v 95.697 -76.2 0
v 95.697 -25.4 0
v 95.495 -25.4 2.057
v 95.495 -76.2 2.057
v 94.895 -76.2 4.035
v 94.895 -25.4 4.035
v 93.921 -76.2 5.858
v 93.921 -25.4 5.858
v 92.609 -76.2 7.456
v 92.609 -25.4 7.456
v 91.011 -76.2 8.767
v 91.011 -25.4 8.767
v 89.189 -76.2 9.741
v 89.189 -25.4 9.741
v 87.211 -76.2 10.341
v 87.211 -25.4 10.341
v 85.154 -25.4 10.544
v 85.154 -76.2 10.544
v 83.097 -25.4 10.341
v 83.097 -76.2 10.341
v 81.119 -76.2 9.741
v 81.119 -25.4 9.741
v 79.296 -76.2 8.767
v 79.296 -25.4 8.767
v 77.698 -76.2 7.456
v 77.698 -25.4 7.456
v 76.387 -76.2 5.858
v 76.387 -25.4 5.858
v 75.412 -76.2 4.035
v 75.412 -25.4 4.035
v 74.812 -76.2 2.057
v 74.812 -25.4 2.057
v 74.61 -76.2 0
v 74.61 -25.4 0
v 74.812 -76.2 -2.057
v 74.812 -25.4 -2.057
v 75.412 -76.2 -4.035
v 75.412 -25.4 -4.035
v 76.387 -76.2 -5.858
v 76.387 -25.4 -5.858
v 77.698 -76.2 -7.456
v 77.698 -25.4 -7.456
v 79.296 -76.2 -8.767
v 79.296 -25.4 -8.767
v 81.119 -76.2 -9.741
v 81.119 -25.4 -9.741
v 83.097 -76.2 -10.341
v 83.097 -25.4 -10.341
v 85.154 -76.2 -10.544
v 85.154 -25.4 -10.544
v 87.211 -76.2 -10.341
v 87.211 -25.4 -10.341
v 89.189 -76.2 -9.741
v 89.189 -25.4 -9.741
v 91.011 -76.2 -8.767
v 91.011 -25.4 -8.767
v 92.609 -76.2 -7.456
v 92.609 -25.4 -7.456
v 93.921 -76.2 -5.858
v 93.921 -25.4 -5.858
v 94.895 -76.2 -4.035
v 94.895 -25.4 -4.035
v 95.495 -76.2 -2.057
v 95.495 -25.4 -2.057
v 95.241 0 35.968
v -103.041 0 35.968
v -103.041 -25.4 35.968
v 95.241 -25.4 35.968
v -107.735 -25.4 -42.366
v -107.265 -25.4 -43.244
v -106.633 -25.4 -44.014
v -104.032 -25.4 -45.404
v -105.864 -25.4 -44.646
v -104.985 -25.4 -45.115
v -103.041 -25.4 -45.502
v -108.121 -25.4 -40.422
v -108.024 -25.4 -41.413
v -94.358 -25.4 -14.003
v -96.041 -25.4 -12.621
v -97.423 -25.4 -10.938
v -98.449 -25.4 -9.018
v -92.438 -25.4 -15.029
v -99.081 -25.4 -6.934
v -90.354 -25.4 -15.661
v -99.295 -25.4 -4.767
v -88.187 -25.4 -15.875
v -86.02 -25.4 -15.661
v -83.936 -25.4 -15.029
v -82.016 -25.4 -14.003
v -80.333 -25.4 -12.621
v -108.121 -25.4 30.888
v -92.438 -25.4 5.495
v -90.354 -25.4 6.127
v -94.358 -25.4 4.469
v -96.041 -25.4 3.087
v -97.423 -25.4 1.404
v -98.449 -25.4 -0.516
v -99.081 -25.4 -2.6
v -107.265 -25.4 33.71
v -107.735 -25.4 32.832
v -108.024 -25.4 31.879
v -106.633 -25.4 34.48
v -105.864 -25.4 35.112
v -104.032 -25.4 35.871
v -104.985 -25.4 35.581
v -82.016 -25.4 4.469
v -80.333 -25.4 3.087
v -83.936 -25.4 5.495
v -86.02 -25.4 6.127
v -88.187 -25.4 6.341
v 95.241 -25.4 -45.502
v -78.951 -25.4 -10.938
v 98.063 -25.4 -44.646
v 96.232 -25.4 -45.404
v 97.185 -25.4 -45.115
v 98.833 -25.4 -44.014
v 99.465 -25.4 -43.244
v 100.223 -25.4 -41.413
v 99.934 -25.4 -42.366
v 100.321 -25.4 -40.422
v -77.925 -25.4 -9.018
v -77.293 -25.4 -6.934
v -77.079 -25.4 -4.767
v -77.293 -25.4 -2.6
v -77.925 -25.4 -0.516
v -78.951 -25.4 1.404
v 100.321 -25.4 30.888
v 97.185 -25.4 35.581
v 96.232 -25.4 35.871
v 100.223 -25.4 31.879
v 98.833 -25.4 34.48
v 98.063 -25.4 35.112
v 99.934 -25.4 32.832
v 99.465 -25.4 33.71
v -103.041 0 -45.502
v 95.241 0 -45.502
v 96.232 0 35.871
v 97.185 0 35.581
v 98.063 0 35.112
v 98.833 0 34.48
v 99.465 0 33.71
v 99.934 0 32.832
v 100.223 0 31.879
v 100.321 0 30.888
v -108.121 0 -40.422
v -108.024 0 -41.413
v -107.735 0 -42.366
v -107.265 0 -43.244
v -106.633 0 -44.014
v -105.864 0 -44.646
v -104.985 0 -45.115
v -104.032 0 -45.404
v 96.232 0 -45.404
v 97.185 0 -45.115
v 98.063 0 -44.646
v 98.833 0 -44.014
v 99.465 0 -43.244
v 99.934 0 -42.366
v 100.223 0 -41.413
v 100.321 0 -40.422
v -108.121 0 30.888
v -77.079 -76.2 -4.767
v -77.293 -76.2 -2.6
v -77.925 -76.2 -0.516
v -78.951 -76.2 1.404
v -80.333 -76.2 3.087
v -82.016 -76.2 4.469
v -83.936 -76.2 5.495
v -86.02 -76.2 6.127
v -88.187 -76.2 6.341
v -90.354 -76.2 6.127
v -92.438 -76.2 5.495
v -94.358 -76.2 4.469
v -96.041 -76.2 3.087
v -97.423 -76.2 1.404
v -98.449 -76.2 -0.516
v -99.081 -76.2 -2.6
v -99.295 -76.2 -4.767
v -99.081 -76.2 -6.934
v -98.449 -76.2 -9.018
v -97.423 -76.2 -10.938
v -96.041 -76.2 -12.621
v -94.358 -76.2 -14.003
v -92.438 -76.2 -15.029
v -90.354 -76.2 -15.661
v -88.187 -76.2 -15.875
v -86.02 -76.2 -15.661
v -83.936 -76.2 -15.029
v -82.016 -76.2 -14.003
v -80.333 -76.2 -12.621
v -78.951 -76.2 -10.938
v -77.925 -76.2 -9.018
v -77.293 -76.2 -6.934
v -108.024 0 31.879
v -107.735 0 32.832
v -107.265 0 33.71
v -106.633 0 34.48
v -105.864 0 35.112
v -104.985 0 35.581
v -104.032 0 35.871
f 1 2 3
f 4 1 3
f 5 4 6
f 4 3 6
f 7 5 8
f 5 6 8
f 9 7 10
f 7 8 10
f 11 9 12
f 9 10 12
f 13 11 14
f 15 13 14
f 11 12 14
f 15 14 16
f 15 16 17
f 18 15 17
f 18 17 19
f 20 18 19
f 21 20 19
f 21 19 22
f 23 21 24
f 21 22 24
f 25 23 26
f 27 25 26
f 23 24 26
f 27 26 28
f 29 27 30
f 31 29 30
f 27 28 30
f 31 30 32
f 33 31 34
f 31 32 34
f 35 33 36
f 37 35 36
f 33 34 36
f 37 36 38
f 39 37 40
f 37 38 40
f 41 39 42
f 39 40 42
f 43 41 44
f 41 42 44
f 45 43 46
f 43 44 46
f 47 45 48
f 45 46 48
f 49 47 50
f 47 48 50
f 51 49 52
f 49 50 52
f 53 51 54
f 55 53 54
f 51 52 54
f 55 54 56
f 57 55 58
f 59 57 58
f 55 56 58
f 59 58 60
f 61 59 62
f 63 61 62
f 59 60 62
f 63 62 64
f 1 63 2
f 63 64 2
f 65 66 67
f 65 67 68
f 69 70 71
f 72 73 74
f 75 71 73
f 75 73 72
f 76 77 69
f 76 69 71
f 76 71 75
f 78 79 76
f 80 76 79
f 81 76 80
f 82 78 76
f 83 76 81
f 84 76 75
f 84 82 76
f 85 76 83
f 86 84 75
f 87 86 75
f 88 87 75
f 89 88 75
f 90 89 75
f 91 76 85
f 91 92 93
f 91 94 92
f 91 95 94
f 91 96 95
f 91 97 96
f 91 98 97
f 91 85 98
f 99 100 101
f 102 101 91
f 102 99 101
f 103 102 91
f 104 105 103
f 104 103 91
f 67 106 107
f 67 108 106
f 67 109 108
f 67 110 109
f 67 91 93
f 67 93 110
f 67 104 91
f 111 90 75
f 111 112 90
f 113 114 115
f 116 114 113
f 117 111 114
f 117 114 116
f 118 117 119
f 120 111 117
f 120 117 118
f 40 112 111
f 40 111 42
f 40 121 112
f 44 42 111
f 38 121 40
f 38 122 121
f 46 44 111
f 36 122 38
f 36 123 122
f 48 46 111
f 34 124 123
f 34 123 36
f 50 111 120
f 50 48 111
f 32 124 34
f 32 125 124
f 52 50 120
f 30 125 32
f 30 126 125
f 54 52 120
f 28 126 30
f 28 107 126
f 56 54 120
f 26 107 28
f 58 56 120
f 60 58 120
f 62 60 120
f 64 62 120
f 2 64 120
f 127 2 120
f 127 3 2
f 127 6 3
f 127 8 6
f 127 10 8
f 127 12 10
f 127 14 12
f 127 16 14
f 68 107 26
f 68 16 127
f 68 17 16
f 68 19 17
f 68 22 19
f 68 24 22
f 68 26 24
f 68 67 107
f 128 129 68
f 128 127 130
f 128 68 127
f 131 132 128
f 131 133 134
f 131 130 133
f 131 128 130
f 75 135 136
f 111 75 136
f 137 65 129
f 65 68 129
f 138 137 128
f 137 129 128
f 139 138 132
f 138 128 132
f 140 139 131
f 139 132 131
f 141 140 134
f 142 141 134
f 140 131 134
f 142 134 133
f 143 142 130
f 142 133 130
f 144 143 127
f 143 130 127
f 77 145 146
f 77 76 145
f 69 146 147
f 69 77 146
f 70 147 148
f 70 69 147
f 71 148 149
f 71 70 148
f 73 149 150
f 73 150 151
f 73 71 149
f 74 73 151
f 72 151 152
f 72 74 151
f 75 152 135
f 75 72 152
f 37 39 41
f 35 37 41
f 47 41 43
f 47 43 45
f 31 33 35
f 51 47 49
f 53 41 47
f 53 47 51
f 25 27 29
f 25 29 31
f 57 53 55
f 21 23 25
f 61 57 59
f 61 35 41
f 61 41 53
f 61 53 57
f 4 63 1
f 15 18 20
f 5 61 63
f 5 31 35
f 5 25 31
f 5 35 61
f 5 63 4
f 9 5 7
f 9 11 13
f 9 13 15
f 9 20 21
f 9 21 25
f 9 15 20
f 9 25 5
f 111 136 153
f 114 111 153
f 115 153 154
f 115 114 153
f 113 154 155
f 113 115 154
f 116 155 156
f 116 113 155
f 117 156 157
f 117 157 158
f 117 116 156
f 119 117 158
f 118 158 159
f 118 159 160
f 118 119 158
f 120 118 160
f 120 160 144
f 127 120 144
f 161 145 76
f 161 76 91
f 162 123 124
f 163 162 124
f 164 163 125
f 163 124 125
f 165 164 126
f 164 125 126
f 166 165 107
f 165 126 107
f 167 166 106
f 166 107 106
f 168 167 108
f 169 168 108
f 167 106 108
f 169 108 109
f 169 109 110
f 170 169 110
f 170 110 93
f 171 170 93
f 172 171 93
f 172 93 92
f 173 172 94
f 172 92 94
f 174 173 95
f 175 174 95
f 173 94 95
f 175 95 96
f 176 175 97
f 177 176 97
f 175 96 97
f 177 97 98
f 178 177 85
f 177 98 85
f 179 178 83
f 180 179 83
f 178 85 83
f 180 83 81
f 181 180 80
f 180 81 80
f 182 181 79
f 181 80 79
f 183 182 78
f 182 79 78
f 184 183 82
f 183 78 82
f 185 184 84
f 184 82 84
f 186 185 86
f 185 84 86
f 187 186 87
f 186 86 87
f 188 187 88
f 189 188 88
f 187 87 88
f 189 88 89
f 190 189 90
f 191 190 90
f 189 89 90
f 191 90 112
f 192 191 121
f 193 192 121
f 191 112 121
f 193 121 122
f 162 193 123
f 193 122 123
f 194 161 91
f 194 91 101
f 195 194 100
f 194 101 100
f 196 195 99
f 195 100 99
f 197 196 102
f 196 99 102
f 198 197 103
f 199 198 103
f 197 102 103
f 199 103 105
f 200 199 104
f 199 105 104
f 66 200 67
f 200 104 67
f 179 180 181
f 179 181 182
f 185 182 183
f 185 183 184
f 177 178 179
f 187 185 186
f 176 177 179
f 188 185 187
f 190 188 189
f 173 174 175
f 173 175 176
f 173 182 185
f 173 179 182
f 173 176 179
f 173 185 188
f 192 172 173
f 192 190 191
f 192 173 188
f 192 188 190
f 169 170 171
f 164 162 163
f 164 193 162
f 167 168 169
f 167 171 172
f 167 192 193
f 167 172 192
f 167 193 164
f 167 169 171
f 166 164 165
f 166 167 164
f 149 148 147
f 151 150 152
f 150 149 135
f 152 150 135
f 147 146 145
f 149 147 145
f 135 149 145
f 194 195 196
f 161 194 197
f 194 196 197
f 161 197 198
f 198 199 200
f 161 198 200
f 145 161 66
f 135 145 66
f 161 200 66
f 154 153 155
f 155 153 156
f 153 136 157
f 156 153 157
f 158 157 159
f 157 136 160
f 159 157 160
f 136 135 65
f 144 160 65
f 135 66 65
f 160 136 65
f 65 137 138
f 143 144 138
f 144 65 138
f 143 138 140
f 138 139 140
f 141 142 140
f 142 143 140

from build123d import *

# Parameters (mm, degrees)
F0_W     = 208.4420993924
F0_H     = 81.4700946212
F1_DEPTH = 25.4
F2_R     = 11.1076712279
F2_R_2   = 10.5439005504
F3_DEPTH = 50.8
F7_R     = 5.08


# Not quite as in the source:
# - the program builds the solid bodies; features that only make, move or delete a surface that nothing else refers to are left out


with BuildPart() as f1:
    # F0 (on Front) → F1 (new body)
    with BuildSketch(Plane.XZ):
        with Locations((-3.9001591504, -4.76687029)):
            Rectangle(F0_W, F0_H)
    extrude(amount=F1_DEPTH)

    # F2 (on face) → F3 (join)
    with BuildSketch(Plane.XZ.offset(25.4)):
        with Locations((-88.1870388985, -4.7668707557)):
            Circle(F2_R)
        with Locations((85.1535871625, 0)):
            Circle(F2_R_2)
    extrude(amount=F3_DEPTH)

    # F7
    f7_edges = [f1.edges().sort_by_distance(p)[0] for p in [
        (100.320891, -12.7, -45.501918),
        (-108.121209, -12.7, -45.501918),
        (-108.121209, -12.7, 35.968177),
        (100.320891, -12.7, 35.968177),
    ]]
    fillet(f7_edges, radius=F7_R)


solid = f1.part
